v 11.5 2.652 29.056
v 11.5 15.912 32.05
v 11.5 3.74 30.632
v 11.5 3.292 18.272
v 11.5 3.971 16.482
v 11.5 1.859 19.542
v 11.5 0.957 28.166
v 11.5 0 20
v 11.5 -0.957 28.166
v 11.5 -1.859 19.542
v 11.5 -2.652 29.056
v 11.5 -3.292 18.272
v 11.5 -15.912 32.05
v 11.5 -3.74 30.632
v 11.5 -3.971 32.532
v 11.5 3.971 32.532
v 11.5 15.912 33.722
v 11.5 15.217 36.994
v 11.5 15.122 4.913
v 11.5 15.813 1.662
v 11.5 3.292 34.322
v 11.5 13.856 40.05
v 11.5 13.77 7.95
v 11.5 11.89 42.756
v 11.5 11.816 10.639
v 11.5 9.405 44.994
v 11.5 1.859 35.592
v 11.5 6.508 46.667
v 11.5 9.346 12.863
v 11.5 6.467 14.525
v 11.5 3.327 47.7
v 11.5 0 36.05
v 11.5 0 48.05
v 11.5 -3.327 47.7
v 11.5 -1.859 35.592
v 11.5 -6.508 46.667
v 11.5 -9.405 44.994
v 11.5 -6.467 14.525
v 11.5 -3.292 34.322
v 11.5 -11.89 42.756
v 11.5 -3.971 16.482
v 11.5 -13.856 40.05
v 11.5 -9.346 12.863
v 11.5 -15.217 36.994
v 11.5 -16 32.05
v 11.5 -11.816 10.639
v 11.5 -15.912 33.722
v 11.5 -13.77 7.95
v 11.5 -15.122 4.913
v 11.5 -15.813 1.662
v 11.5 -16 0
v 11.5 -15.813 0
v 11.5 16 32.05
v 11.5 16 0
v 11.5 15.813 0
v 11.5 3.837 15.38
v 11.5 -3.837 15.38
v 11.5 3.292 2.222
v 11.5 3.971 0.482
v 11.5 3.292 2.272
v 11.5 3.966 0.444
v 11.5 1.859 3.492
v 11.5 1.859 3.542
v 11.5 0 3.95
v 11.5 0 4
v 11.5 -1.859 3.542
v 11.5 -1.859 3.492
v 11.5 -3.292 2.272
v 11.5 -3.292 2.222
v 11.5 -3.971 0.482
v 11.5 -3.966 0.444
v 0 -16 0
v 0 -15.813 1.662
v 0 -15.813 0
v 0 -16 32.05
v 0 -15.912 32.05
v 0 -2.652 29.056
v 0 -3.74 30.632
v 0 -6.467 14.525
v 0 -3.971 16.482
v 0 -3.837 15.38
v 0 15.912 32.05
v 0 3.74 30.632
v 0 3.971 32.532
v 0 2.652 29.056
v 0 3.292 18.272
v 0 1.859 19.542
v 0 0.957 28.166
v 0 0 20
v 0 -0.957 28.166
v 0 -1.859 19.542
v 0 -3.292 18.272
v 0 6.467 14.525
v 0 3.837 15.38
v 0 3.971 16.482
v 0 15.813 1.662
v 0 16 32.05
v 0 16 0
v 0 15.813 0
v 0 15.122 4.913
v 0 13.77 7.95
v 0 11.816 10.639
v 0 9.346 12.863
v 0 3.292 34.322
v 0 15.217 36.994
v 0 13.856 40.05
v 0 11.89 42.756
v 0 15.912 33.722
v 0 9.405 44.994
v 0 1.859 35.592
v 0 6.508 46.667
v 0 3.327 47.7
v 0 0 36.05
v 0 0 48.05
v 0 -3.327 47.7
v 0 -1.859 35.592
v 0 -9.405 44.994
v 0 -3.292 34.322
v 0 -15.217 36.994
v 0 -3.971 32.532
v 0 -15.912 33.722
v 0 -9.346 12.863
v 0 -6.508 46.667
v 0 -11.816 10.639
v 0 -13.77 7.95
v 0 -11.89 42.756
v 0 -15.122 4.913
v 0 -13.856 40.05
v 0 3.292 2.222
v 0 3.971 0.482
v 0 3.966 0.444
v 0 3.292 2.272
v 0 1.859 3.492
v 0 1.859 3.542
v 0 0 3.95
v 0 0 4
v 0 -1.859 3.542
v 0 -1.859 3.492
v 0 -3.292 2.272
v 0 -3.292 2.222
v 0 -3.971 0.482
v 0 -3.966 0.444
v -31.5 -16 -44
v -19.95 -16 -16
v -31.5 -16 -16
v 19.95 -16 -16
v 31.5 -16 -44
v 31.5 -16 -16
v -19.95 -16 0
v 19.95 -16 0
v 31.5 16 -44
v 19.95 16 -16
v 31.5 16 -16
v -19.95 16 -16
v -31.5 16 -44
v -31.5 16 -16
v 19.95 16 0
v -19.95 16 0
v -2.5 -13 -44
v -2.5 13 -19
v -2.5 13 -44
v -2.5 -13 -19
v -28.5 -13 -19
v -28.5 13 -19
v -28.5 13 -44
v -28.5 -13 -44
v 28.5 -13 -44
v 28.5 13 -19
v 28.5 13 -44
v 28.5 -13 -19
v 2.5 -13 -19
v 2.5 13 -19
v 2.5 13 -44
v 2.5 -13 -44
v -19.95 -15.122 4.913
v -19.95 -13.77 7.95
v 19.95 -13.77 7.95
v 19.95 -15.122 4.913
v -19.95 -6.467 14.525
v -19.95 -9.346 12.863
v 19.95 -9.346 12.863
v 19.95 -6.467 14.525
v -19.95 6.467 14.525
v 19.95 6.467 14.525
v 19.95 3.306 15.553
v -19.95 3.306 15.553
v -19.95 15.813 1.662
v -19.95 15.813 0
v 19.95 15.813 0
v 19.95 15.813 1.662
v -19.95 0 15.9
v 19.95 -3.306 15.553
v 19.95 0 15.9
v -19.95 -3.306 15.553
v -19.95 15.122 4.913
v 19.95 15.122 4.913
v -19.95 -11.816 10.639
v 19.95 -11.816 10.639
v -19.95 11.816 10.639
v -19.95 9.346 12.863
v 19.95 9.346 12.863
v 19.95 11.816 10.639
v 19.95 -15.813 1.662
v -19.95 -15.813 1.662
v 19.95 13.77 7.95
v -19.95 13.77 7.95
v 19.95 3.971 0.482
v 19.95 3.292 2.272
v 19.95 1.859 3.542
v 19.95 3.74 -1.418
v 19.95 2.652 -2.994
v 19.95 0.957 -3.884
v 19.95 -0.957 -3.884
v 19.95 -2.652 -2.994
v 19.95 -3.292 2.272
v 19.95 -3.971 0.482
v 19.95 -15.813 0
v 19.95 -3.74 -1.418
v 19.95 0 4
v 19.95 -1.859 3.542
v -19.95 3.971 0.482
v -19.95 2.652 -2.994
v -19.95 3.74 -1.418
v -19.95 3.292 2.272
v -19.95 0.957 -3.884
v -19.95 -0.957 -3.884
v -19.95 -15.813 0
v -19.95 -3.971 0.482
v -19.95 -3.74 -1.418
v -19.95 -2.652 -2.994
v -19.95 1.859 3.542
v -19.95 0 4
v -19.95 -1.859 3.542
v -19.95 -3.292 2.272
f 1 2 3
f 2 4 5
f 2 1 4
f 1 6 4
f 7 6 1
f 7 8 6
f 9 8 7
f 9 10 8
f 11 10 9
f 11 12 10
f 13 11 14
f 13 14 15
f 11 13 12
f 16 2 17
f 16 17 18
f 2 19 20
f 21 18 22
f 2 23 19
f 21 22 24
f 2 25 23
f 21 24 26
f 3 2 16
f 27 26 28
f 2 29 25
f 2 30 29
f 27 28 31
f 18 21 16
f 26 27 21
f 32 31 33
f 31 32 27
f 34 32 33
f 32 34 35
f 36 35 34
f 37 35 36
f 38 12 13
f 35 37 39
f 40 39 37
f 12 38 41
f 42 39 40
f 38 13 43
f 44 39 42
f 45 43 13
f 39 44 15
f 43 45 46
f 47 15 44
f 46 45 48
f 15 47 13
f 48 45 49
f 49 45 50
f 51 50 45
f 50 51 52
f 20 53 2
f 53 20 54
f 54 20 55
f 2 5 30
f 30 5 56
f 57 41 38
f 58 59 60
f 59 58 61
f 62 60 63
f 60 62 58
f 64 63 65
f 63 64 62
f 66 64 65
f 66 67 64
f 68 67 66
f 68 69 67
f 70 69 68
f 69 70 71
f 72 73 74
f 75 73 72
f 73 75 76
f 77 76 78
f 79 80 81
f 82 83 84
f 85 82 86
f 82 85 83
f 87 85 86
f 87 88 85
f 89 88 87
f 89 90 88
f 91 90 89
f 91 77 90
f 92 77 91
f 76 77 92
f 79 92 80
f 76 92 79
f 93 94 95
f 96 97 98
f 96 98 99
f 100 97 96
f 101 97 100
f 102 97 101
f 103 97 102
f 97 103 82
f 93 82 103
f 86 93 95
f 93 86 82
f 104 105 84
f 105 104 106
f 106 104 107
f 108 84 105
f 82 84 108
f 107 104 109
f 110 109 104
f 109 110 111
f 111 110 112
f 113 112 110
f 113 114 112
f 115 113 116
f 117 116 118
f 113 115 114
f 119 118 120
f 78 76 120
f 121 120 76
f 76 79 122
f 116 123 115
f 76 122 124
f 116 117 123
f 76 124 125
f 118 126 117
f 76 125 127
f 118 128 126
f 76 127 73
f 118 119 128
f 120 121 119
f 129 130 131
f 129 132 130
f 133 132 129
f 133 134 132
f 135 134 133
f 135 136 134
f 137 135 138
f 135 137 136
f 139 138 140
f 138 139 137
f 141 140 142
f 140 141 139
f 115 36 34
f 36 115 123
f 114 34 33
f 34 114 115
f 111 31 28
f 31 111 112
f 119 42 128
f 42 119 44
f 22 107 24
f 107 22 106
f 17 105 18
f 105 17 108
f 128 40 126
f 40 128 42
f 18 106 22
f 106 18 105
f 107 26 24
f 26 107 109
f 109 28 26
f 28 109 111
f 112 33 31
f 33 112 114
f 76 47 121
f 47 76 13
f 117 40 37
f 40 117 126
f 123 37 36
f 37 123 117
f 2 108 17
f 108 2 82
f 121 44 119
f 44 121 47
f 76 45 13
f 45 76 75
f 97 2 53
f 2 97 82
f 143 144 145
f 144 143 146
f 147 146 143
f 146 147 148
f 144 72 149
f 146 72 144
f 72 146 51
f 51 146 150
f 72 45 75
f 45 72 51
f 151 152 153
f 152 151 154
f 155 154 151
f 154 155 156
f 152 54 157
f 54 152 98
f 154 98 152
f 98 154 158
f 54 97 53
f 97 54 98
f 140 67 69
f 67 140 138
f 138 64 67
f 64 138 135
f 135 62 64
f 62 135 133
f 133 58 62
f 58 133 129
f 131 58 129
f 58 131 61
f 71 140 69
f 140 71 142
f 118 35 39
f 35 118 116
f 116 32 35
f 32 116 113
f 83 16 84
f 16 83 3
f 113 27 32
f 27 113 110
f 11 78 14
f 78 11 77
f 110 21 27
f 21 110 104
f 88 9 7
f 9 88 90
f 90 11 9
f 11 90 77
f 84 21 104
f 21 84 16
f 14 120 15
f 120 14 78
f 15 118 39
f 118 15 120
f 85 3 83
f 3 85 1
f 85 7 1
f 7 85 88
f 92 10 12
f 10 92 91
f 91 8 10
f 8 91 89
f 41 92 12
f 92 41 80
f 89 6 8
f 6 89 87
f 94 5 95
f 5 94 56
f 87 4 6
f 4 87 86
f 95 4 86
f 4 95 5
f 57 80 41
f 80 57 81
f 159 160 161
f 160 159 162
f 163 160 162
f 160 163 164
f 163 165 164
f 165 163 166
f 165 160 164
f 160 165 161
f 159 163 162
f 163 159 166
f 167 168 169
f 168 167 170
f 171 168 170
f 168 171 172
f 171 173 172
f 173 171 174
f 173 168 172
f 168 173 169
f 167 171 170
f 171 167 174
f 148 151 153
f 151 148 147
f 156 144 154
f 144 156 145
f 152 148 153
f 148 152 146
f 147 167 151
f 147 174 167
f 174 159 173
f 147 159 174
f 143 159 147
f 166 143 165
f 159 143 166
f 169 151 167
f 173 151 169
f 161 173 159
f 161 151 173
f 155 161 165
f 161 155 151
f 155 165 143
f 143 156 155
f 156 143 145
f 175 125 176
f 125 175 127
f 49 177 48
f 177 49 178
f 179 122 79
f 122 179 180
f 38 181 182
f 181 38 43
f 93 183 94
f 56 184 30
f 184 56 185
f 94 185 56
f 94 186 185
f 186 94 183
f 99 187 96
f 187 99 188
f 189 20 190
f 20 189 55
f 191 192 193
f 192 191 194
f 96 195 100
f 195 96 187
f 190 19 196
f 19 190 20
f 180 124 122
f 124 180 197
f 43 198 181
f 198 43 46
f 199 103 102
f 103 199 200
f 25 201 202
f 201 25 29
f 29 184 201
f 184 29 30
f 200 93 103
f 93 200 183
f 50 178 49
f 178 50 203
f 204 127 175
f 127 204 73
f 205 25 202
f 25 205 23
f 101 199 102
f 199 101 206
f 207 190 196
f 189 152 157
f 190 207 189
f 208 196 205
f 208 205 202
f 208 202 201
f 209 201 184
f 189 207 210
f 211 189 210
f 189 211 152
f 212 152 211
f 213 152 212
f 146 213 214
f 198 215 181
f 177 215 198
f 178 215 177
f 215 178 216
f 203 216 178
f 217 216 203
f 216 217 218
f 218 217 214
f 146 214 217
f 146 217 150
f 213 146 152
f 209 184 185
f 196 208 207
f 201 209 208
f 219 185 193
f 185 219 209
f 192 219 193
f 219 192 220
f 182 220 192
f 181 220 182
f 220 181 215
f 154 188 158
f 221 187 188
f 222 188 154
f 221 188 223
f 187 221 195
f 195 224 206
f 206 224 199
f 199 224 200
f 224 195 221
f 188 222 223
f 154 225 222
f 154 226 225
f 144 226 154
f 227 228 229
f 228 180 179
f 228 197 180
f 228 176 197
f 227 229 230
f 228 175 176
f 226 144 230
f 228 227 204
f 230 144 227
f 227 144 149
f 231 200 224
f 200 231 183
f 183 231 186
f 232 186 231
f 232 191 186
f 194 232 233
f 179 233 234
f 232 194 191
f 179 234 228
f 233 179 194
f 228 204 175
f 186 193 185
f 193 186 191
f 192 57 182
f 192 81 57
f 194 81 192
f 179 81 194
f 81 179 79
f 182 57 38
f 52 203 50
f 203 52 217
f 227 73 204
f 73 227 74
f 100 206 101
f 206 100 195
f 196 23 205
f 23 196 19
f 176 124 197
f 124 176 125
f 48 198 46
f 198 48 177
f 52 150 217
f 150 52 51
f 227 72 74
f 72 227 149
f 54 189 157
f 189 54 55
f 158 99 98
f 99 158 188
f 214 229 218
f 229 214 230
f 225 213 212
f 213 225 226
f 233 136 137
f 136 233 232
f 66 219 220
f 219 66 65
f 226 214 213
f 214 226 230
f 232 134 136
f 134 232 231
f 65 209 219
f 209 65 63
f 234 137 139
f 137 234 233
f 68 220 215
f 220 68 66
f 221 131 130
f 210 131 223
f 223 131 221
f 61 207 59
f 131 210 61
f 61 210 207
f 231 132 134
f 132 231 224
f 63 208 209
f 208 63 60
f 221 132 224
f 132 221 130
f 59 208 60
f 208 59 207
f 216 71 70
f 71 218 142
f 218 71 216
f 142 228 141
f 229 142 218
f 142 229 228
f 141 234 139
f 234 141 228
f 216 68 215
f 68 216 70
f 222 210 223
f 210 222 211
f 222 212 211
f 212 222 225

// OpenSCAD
//diameter of pin
pindia = 8;
//extrusion side
extrusionside = 26;
//distance between the two extrusions
extrusionsep = 5;
//Thickness of material around the extrusion
extrusionsurrond = 3;
//legnth of material going over the extrusion (covering the extrusion)
extrusioncover = 25;
// the width of the inside of the hinge
hingewidth = 40;
//thickness of material around pin
pinsurrond = (extrusionside+extrusionsurrond*2-pindia)/2;
//the offset of the hinge from the start of hinge joint
hingeoffset = 0;
// tolerance for the hinge radially
pinsurrondtol = .1;
//tolerance for the hinge axially
hingetol = .2;

module cap() {
    difference(){
        union(){
            translate([-(extrusionsep + extrusionside*2+extrusionsurrond*2)/2, -(extrusionside+extrusionsurrond*2)/2,0]){cube([extrusionsep + extrusionside*2+extrusionsurrond*2, extrusionside+extrusionsurrond*2,extrusioncover+extrusionsurrond]);}
        }
        
        union(){
            translate([-extrusionsep/2-extrusionside,-extrusionside/2,-1]){cube([extrusionside,extrusionside,extrusioncover + 1]);}
            translate([extrusionsep/2,-extrusionside/2,-1]){cube([extrusionside,extrusionside,extrusioncover + 1]);}
        }
    }
}

//cap();

module hingein(){
    difference(){
        union(){
            translate([-(hingewidth - hingetol/2)/2,0,0]){rotate(a = [0,90,0]){cylinder(r = (pindia+pinsurrond*2-pinsurrondtol*2)/2, h = hingewidth - hingetol/2);}}
            translate([-(hingewidth - hingetol/2)/2,-(pindia+pinsurrond*2)/2,0]){cube([hingewidth - hingetol/2,(pindia+pinsurrond*2),(pindia+pinsurrond*2)/2]);}
        }
        
        union(){
            translate([-(hingewidth - hingetol/2 + 1)/2,0,0]){rotate(a = [0,90,0]){cylinder(r = (pindia)/2, h = hingewidth - hingetol/2 + 1);}}
        }
    }
}

//hingein();

module hingeout(){
     difference(){
        union(){
            translate([-(extrusionsep + extrusionside*2+extrusionsurrond*2)/2,0,0]){rotate(a = [0,90,0]){cylinder(r = (pindia+pinsurrond*2-pinsurrondtol*2)/2, h = extrusionsep + extrusionside*2+extrusionsurrond*2);}}
            translate([-(extrusionsep + extrusionside*2+extrusionsurrond*2)/2,-(pindia+pinsurrond*2)/2,0]){cube([extrusionsep + extrusionside*2+extrusionsurrond*2,(pindia+pinsurrond*2),(pindia+pinsurrond*2)/2 + hingeoffset]);}
        }
        
        union(){
            translate([-(extrusionsep + extrusionside*2+extrusionsurrond*2 + 1)/2,0,0]){rotate(a = [0,90,0]){cylinder(r = (pindia)/2, h = extrusionsep + extrusionside*2+extrusionsurrond*2 + 1);}}
            
            translate([-(hingewidth + hingetol/2)/2,-(pindia+pinsurrond*2 + 1)/2,-(pindia+pinsurrond*2 + 1)/2]){cube([hingewidth + hingetol/2,(pindia+pinsurrond*2 + 1),(pindia+pinsurrond*2 + hingeoffset+ 1)]);}
        }
    }
}

module connection(){
    difference(){
        union(){
            translate([-(pinsurrond*2 + pinsurrondtol+ pindia)/2,0,0]){cylinder(r = (pindia + pinsurrond*2)/2, h = (extrusionsep + extrusionside*2+extrusionsurrond*2 - hingewidth )/ 2);}
            translate([(pinsurrond*2 + pinsurrondtol+ pindia)/2,0,0]){cylinder(r = (pindia + pinsurrond*2)/2, h = (extrusionsep + extrusionside*2+extrusionsurrond*2 - hingewidth )/ 2);}
            translate([-(pinsurrond*2 + pinsurrondtol+ pindia)/2,-(pindia + pinsurrond*2)/2,0]){cube([pinsurrond*2 + pinsurrondtol+ pindia,pindia + pinsurrond*2,(extrusionsep + extrusionside*2+extrusionsurrond*2 - hingewidth )/ 2]);}
        }
        
        union(){
            translate([-(pinsurrond*2 + pinsurrondtol+ pindia)/2,0,-.1]){cylinder(r = (pindia)/2, h = (extrusionsep + extrusionside*2+extrusionsurrond*2 - hingewidth )/ 2 + .2);}
            translate([(pinsurrond*2 + pinsurrondtol+ pindia)/2,0,-.1]){cylinder(r = (pindia)/2, h = (extrusionsep + extrusionside*2+extrusionsurrond*2 - hingewidth )/ 2 + .2);}
            translate([0,0,-.1]){cylinder(r = (pindia)/2, h = (extrusionsep + extrusionside*2+extrusionsurrond*2 - hingewidth )/ 2 + .2);}
        }
    }
}
rotate(a = [0,270,180]){translate([pinsurrond+pindia/2,0,0]){connection();}}

//hingeout();
/*
//lower
union(){
    translate([0,0,(pindia+pinsurrond*2)/2+extrusioncover+extrusionsurrond + hingeoffset]){rotate(a = [180,0,0]){cap();}}
    hingeout();
}
*/
//upper
rotate(a = [180,0,0]){union(){
        translate([0,0,(pindia+pinsurrond*2)/2+extrusioncover+extrusionsurrond]){rotate(a = [180,0,0]){cap();}}
    hingein();
}}
